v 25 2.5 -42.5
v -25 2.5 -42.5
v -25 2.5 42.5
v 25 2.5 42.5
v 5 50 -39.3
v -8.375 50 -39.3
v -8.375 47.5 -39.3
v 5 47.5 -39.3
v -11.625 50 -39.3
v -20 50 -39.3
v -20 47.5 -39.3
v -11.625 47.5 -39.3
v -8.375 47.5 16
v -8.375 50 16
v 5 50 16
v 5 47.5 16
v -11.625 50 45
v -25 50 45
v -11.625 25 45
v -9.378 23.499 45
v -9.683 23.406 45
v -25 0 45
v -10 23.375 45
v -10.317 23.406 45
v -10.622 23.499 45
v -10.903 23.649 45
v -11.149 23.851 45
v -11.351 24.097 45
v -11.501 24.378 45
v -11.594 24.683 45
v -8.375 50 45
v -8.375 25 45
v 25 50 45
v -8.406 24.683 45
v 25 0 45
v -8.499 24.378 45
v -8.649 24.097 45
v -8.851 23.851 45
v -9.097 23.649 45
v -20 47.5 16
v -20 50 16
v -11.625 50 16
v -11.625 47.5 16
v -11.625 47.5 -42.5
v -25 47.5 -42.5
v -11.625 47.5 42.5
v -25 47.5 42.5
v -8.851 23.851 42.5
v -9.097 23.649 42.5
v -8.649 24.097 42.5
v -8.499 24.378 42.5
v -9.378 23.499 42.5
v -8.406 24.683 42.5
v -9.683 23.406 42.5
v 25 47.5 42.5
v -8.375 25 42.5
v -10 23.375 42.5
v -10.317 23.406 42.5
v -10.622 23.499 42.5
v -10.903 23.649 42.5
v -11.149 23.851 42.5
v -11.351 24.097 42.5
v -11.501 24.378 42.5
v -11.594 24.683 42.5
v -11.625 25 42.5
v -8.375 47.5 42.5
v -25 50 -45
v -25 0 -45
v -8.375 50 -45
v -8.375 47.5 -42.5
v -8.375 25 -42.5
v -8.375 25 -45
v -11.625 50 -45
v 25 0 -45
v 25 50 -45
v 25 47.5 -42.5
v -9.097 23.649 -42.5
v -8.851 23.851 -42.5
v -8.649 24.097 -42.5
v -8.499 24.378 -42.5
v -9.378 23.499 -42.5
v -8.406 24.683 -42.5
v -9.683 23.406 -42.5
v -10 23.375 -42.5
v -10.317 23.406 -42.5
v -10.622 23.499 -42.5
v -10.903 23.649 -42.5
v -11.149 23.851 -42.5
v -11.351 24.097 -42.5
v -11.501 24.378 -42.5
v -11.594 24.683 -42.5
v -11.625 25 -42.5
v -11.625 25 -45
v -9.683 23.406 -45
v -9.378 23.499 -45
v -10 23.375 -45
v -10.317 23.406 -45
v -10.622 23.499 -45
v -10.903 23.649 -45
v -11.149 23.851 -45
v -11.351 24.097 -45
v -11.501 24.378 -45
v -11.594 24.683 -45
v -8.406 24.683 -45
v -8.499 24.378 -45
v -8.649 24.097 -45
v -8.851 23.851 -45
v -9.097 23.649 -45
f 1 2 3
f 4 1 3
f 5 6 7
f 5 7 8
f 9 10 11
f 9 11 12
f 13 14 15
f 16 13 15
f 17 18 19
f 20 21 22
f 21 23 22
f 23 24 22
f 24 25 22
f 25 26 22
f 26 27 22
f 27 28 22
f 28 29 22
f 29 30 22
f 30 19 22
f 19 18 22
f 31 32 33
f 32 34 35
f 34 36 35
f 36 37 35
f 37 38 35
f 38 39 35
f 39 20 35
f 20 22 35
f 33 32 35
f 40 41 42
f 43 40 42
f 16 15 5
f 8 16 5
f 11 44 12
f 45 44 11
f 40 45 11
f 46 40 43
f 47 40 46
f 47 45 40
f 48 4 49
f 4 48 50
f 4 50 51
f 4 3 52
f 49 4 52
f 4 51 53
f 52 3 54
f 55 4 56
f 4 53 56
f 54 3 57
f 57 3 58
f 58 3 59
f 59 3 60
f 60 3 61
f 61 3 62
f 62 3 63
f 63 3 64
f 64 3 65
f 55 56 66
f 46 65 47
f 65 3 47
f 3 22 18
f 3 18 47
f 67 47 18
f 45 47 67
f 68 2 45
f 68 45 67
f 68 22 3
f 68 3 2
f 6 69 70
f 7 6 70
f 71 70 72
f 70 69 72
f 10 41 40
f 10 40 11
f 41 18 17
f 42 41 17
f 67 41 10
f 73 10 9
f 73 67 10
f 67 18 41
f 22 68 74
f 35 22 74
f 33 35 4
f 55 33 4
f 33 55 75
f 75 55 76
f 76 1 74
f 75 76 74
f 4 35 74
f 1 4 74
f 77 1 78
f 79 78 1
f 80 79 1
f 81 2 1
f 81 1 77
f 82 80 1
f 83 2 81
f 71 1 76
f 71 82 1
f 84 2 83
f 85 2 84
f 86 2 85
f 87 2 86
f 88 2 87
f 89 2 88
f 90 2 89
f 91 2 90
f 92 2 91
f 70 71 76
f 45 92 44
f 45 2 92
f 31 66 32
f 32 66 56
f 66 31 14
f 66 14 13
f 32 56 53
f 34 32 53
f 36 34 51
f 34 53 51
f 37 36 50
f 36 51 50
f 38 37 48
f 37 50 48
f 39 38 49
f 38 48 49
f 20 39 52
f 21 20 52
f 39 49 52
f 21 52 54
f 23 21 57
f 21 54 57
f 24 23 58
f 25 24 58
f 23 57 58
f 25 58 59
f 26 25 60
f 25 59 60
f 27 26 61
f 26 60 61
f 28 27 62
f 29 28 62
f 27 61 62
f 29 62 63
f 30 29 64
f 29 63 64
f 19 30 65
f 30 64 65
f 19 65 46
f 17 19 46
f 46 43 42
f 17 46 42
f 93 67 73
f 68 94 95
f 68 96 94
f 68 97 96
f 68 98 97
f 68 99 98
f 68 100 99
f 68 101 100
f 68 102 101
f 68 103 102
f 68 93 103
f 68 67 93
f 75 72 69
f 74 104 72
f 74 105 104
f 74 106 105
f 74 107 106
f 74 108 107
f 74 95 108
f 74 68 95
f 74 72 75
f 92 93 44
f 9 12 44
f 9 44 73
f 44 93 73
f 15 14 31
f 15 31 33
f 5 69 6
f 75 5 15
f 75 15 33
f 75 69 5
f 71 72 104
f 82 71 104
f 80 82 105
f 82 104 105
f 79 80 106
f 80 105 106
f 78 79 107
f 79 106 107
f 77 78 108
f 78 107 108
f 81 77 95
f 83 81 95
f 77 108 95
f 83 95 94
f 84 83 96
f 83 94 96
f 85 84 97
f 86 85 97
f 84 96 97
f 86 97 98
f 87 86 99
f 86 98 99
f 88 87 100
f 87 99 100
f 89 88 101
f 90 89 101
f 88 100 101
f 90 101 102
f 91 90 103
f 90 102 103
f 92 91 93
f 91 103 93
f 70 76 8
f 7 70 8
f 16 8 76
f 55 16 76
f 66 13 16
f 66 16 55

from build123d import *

# Parameters (mm, degrees)
SKETCH_1_W               = 50
SKETCH_1_H               = 90
EXTRUDE_1_DEPTH          = 50
SKETCH_2_W               = 25
SKETCH_2_H               = 55.3
CUT_EXTRUDE_1_DEPTH      = 10
SKETCH_3_W               = 85
SKETCH_3_H               = 45
CUT_EXTRUDE_2_DEPTH      = 84.815273071
CUT_EXTRUDE_3_DEPTH      = 106.948100502
CUT_EXTRUDE_3_DEPTH_BACK = 106.948100502


with BuildPart() as part:
    # 草图1 → 凸台-拉伸1 (new body)
    with BuildSketch(Plane(origin=(0, 0, 0), x_dir=(1, 0, 0), z_dir=(0, 1, 0))):
        Rectangle(SKETCH_1_W, SKETCH_1_H)
    extrude(amount=EXTRUDE_1_DEPTH)

    # 草图2 → 切除-拉伸1 (cut)
    with BuildSketch(Plane(origin=(0, 50, 0), x_dir=(1, 0, 0), z_dir=(0, 1, 0))):
        with Locations((-7.5, 11.65)):
            Rectangle(SKETCH_2_W, SKETCH_2_H)
    extrude(amount=-CUT_EXTRUDE_1_DEPTH, mode=Mode.SUBTRACT)

    # 草图3 → 切除-拉伸2 (cut, through all)
    with BuildSketch(Plane.ZY.offset(25)):
        with Locations((0, 25)):
            Rectangle(SKETCH_3_W, SKETCH_3_H)
    extrude(amount=-CUT_EXTRUDE_2_DEPTH, mode=Mode.SUBTRACT)

    # 草图4 → 切除-拉伸3 (cut, two sides: drawn at the far end of the back side and taken through both)
    with BuildSketch(Plane.XY.offset(45).offset(-CUT_EXTRUDE_3_DEPTH_BACK)):
        with BuildLine():
            Line((-11.625, 25), (-11.625, 50))
            Line((-11.625, 50), (-8.375, 50))
            Line((-8.375, 50), (-8.375, 25))
            ThreePointArc((-8.375, 25), (-10, 23.375), (-11.625, 25))
        make_face()
    extrude(amount=CUT_EXTRUDE_3_DEPTH + CUT_EXTRUDE_3_DEPTH_BACK, mode=Mode.SUBTRACT)


solid = part.part
